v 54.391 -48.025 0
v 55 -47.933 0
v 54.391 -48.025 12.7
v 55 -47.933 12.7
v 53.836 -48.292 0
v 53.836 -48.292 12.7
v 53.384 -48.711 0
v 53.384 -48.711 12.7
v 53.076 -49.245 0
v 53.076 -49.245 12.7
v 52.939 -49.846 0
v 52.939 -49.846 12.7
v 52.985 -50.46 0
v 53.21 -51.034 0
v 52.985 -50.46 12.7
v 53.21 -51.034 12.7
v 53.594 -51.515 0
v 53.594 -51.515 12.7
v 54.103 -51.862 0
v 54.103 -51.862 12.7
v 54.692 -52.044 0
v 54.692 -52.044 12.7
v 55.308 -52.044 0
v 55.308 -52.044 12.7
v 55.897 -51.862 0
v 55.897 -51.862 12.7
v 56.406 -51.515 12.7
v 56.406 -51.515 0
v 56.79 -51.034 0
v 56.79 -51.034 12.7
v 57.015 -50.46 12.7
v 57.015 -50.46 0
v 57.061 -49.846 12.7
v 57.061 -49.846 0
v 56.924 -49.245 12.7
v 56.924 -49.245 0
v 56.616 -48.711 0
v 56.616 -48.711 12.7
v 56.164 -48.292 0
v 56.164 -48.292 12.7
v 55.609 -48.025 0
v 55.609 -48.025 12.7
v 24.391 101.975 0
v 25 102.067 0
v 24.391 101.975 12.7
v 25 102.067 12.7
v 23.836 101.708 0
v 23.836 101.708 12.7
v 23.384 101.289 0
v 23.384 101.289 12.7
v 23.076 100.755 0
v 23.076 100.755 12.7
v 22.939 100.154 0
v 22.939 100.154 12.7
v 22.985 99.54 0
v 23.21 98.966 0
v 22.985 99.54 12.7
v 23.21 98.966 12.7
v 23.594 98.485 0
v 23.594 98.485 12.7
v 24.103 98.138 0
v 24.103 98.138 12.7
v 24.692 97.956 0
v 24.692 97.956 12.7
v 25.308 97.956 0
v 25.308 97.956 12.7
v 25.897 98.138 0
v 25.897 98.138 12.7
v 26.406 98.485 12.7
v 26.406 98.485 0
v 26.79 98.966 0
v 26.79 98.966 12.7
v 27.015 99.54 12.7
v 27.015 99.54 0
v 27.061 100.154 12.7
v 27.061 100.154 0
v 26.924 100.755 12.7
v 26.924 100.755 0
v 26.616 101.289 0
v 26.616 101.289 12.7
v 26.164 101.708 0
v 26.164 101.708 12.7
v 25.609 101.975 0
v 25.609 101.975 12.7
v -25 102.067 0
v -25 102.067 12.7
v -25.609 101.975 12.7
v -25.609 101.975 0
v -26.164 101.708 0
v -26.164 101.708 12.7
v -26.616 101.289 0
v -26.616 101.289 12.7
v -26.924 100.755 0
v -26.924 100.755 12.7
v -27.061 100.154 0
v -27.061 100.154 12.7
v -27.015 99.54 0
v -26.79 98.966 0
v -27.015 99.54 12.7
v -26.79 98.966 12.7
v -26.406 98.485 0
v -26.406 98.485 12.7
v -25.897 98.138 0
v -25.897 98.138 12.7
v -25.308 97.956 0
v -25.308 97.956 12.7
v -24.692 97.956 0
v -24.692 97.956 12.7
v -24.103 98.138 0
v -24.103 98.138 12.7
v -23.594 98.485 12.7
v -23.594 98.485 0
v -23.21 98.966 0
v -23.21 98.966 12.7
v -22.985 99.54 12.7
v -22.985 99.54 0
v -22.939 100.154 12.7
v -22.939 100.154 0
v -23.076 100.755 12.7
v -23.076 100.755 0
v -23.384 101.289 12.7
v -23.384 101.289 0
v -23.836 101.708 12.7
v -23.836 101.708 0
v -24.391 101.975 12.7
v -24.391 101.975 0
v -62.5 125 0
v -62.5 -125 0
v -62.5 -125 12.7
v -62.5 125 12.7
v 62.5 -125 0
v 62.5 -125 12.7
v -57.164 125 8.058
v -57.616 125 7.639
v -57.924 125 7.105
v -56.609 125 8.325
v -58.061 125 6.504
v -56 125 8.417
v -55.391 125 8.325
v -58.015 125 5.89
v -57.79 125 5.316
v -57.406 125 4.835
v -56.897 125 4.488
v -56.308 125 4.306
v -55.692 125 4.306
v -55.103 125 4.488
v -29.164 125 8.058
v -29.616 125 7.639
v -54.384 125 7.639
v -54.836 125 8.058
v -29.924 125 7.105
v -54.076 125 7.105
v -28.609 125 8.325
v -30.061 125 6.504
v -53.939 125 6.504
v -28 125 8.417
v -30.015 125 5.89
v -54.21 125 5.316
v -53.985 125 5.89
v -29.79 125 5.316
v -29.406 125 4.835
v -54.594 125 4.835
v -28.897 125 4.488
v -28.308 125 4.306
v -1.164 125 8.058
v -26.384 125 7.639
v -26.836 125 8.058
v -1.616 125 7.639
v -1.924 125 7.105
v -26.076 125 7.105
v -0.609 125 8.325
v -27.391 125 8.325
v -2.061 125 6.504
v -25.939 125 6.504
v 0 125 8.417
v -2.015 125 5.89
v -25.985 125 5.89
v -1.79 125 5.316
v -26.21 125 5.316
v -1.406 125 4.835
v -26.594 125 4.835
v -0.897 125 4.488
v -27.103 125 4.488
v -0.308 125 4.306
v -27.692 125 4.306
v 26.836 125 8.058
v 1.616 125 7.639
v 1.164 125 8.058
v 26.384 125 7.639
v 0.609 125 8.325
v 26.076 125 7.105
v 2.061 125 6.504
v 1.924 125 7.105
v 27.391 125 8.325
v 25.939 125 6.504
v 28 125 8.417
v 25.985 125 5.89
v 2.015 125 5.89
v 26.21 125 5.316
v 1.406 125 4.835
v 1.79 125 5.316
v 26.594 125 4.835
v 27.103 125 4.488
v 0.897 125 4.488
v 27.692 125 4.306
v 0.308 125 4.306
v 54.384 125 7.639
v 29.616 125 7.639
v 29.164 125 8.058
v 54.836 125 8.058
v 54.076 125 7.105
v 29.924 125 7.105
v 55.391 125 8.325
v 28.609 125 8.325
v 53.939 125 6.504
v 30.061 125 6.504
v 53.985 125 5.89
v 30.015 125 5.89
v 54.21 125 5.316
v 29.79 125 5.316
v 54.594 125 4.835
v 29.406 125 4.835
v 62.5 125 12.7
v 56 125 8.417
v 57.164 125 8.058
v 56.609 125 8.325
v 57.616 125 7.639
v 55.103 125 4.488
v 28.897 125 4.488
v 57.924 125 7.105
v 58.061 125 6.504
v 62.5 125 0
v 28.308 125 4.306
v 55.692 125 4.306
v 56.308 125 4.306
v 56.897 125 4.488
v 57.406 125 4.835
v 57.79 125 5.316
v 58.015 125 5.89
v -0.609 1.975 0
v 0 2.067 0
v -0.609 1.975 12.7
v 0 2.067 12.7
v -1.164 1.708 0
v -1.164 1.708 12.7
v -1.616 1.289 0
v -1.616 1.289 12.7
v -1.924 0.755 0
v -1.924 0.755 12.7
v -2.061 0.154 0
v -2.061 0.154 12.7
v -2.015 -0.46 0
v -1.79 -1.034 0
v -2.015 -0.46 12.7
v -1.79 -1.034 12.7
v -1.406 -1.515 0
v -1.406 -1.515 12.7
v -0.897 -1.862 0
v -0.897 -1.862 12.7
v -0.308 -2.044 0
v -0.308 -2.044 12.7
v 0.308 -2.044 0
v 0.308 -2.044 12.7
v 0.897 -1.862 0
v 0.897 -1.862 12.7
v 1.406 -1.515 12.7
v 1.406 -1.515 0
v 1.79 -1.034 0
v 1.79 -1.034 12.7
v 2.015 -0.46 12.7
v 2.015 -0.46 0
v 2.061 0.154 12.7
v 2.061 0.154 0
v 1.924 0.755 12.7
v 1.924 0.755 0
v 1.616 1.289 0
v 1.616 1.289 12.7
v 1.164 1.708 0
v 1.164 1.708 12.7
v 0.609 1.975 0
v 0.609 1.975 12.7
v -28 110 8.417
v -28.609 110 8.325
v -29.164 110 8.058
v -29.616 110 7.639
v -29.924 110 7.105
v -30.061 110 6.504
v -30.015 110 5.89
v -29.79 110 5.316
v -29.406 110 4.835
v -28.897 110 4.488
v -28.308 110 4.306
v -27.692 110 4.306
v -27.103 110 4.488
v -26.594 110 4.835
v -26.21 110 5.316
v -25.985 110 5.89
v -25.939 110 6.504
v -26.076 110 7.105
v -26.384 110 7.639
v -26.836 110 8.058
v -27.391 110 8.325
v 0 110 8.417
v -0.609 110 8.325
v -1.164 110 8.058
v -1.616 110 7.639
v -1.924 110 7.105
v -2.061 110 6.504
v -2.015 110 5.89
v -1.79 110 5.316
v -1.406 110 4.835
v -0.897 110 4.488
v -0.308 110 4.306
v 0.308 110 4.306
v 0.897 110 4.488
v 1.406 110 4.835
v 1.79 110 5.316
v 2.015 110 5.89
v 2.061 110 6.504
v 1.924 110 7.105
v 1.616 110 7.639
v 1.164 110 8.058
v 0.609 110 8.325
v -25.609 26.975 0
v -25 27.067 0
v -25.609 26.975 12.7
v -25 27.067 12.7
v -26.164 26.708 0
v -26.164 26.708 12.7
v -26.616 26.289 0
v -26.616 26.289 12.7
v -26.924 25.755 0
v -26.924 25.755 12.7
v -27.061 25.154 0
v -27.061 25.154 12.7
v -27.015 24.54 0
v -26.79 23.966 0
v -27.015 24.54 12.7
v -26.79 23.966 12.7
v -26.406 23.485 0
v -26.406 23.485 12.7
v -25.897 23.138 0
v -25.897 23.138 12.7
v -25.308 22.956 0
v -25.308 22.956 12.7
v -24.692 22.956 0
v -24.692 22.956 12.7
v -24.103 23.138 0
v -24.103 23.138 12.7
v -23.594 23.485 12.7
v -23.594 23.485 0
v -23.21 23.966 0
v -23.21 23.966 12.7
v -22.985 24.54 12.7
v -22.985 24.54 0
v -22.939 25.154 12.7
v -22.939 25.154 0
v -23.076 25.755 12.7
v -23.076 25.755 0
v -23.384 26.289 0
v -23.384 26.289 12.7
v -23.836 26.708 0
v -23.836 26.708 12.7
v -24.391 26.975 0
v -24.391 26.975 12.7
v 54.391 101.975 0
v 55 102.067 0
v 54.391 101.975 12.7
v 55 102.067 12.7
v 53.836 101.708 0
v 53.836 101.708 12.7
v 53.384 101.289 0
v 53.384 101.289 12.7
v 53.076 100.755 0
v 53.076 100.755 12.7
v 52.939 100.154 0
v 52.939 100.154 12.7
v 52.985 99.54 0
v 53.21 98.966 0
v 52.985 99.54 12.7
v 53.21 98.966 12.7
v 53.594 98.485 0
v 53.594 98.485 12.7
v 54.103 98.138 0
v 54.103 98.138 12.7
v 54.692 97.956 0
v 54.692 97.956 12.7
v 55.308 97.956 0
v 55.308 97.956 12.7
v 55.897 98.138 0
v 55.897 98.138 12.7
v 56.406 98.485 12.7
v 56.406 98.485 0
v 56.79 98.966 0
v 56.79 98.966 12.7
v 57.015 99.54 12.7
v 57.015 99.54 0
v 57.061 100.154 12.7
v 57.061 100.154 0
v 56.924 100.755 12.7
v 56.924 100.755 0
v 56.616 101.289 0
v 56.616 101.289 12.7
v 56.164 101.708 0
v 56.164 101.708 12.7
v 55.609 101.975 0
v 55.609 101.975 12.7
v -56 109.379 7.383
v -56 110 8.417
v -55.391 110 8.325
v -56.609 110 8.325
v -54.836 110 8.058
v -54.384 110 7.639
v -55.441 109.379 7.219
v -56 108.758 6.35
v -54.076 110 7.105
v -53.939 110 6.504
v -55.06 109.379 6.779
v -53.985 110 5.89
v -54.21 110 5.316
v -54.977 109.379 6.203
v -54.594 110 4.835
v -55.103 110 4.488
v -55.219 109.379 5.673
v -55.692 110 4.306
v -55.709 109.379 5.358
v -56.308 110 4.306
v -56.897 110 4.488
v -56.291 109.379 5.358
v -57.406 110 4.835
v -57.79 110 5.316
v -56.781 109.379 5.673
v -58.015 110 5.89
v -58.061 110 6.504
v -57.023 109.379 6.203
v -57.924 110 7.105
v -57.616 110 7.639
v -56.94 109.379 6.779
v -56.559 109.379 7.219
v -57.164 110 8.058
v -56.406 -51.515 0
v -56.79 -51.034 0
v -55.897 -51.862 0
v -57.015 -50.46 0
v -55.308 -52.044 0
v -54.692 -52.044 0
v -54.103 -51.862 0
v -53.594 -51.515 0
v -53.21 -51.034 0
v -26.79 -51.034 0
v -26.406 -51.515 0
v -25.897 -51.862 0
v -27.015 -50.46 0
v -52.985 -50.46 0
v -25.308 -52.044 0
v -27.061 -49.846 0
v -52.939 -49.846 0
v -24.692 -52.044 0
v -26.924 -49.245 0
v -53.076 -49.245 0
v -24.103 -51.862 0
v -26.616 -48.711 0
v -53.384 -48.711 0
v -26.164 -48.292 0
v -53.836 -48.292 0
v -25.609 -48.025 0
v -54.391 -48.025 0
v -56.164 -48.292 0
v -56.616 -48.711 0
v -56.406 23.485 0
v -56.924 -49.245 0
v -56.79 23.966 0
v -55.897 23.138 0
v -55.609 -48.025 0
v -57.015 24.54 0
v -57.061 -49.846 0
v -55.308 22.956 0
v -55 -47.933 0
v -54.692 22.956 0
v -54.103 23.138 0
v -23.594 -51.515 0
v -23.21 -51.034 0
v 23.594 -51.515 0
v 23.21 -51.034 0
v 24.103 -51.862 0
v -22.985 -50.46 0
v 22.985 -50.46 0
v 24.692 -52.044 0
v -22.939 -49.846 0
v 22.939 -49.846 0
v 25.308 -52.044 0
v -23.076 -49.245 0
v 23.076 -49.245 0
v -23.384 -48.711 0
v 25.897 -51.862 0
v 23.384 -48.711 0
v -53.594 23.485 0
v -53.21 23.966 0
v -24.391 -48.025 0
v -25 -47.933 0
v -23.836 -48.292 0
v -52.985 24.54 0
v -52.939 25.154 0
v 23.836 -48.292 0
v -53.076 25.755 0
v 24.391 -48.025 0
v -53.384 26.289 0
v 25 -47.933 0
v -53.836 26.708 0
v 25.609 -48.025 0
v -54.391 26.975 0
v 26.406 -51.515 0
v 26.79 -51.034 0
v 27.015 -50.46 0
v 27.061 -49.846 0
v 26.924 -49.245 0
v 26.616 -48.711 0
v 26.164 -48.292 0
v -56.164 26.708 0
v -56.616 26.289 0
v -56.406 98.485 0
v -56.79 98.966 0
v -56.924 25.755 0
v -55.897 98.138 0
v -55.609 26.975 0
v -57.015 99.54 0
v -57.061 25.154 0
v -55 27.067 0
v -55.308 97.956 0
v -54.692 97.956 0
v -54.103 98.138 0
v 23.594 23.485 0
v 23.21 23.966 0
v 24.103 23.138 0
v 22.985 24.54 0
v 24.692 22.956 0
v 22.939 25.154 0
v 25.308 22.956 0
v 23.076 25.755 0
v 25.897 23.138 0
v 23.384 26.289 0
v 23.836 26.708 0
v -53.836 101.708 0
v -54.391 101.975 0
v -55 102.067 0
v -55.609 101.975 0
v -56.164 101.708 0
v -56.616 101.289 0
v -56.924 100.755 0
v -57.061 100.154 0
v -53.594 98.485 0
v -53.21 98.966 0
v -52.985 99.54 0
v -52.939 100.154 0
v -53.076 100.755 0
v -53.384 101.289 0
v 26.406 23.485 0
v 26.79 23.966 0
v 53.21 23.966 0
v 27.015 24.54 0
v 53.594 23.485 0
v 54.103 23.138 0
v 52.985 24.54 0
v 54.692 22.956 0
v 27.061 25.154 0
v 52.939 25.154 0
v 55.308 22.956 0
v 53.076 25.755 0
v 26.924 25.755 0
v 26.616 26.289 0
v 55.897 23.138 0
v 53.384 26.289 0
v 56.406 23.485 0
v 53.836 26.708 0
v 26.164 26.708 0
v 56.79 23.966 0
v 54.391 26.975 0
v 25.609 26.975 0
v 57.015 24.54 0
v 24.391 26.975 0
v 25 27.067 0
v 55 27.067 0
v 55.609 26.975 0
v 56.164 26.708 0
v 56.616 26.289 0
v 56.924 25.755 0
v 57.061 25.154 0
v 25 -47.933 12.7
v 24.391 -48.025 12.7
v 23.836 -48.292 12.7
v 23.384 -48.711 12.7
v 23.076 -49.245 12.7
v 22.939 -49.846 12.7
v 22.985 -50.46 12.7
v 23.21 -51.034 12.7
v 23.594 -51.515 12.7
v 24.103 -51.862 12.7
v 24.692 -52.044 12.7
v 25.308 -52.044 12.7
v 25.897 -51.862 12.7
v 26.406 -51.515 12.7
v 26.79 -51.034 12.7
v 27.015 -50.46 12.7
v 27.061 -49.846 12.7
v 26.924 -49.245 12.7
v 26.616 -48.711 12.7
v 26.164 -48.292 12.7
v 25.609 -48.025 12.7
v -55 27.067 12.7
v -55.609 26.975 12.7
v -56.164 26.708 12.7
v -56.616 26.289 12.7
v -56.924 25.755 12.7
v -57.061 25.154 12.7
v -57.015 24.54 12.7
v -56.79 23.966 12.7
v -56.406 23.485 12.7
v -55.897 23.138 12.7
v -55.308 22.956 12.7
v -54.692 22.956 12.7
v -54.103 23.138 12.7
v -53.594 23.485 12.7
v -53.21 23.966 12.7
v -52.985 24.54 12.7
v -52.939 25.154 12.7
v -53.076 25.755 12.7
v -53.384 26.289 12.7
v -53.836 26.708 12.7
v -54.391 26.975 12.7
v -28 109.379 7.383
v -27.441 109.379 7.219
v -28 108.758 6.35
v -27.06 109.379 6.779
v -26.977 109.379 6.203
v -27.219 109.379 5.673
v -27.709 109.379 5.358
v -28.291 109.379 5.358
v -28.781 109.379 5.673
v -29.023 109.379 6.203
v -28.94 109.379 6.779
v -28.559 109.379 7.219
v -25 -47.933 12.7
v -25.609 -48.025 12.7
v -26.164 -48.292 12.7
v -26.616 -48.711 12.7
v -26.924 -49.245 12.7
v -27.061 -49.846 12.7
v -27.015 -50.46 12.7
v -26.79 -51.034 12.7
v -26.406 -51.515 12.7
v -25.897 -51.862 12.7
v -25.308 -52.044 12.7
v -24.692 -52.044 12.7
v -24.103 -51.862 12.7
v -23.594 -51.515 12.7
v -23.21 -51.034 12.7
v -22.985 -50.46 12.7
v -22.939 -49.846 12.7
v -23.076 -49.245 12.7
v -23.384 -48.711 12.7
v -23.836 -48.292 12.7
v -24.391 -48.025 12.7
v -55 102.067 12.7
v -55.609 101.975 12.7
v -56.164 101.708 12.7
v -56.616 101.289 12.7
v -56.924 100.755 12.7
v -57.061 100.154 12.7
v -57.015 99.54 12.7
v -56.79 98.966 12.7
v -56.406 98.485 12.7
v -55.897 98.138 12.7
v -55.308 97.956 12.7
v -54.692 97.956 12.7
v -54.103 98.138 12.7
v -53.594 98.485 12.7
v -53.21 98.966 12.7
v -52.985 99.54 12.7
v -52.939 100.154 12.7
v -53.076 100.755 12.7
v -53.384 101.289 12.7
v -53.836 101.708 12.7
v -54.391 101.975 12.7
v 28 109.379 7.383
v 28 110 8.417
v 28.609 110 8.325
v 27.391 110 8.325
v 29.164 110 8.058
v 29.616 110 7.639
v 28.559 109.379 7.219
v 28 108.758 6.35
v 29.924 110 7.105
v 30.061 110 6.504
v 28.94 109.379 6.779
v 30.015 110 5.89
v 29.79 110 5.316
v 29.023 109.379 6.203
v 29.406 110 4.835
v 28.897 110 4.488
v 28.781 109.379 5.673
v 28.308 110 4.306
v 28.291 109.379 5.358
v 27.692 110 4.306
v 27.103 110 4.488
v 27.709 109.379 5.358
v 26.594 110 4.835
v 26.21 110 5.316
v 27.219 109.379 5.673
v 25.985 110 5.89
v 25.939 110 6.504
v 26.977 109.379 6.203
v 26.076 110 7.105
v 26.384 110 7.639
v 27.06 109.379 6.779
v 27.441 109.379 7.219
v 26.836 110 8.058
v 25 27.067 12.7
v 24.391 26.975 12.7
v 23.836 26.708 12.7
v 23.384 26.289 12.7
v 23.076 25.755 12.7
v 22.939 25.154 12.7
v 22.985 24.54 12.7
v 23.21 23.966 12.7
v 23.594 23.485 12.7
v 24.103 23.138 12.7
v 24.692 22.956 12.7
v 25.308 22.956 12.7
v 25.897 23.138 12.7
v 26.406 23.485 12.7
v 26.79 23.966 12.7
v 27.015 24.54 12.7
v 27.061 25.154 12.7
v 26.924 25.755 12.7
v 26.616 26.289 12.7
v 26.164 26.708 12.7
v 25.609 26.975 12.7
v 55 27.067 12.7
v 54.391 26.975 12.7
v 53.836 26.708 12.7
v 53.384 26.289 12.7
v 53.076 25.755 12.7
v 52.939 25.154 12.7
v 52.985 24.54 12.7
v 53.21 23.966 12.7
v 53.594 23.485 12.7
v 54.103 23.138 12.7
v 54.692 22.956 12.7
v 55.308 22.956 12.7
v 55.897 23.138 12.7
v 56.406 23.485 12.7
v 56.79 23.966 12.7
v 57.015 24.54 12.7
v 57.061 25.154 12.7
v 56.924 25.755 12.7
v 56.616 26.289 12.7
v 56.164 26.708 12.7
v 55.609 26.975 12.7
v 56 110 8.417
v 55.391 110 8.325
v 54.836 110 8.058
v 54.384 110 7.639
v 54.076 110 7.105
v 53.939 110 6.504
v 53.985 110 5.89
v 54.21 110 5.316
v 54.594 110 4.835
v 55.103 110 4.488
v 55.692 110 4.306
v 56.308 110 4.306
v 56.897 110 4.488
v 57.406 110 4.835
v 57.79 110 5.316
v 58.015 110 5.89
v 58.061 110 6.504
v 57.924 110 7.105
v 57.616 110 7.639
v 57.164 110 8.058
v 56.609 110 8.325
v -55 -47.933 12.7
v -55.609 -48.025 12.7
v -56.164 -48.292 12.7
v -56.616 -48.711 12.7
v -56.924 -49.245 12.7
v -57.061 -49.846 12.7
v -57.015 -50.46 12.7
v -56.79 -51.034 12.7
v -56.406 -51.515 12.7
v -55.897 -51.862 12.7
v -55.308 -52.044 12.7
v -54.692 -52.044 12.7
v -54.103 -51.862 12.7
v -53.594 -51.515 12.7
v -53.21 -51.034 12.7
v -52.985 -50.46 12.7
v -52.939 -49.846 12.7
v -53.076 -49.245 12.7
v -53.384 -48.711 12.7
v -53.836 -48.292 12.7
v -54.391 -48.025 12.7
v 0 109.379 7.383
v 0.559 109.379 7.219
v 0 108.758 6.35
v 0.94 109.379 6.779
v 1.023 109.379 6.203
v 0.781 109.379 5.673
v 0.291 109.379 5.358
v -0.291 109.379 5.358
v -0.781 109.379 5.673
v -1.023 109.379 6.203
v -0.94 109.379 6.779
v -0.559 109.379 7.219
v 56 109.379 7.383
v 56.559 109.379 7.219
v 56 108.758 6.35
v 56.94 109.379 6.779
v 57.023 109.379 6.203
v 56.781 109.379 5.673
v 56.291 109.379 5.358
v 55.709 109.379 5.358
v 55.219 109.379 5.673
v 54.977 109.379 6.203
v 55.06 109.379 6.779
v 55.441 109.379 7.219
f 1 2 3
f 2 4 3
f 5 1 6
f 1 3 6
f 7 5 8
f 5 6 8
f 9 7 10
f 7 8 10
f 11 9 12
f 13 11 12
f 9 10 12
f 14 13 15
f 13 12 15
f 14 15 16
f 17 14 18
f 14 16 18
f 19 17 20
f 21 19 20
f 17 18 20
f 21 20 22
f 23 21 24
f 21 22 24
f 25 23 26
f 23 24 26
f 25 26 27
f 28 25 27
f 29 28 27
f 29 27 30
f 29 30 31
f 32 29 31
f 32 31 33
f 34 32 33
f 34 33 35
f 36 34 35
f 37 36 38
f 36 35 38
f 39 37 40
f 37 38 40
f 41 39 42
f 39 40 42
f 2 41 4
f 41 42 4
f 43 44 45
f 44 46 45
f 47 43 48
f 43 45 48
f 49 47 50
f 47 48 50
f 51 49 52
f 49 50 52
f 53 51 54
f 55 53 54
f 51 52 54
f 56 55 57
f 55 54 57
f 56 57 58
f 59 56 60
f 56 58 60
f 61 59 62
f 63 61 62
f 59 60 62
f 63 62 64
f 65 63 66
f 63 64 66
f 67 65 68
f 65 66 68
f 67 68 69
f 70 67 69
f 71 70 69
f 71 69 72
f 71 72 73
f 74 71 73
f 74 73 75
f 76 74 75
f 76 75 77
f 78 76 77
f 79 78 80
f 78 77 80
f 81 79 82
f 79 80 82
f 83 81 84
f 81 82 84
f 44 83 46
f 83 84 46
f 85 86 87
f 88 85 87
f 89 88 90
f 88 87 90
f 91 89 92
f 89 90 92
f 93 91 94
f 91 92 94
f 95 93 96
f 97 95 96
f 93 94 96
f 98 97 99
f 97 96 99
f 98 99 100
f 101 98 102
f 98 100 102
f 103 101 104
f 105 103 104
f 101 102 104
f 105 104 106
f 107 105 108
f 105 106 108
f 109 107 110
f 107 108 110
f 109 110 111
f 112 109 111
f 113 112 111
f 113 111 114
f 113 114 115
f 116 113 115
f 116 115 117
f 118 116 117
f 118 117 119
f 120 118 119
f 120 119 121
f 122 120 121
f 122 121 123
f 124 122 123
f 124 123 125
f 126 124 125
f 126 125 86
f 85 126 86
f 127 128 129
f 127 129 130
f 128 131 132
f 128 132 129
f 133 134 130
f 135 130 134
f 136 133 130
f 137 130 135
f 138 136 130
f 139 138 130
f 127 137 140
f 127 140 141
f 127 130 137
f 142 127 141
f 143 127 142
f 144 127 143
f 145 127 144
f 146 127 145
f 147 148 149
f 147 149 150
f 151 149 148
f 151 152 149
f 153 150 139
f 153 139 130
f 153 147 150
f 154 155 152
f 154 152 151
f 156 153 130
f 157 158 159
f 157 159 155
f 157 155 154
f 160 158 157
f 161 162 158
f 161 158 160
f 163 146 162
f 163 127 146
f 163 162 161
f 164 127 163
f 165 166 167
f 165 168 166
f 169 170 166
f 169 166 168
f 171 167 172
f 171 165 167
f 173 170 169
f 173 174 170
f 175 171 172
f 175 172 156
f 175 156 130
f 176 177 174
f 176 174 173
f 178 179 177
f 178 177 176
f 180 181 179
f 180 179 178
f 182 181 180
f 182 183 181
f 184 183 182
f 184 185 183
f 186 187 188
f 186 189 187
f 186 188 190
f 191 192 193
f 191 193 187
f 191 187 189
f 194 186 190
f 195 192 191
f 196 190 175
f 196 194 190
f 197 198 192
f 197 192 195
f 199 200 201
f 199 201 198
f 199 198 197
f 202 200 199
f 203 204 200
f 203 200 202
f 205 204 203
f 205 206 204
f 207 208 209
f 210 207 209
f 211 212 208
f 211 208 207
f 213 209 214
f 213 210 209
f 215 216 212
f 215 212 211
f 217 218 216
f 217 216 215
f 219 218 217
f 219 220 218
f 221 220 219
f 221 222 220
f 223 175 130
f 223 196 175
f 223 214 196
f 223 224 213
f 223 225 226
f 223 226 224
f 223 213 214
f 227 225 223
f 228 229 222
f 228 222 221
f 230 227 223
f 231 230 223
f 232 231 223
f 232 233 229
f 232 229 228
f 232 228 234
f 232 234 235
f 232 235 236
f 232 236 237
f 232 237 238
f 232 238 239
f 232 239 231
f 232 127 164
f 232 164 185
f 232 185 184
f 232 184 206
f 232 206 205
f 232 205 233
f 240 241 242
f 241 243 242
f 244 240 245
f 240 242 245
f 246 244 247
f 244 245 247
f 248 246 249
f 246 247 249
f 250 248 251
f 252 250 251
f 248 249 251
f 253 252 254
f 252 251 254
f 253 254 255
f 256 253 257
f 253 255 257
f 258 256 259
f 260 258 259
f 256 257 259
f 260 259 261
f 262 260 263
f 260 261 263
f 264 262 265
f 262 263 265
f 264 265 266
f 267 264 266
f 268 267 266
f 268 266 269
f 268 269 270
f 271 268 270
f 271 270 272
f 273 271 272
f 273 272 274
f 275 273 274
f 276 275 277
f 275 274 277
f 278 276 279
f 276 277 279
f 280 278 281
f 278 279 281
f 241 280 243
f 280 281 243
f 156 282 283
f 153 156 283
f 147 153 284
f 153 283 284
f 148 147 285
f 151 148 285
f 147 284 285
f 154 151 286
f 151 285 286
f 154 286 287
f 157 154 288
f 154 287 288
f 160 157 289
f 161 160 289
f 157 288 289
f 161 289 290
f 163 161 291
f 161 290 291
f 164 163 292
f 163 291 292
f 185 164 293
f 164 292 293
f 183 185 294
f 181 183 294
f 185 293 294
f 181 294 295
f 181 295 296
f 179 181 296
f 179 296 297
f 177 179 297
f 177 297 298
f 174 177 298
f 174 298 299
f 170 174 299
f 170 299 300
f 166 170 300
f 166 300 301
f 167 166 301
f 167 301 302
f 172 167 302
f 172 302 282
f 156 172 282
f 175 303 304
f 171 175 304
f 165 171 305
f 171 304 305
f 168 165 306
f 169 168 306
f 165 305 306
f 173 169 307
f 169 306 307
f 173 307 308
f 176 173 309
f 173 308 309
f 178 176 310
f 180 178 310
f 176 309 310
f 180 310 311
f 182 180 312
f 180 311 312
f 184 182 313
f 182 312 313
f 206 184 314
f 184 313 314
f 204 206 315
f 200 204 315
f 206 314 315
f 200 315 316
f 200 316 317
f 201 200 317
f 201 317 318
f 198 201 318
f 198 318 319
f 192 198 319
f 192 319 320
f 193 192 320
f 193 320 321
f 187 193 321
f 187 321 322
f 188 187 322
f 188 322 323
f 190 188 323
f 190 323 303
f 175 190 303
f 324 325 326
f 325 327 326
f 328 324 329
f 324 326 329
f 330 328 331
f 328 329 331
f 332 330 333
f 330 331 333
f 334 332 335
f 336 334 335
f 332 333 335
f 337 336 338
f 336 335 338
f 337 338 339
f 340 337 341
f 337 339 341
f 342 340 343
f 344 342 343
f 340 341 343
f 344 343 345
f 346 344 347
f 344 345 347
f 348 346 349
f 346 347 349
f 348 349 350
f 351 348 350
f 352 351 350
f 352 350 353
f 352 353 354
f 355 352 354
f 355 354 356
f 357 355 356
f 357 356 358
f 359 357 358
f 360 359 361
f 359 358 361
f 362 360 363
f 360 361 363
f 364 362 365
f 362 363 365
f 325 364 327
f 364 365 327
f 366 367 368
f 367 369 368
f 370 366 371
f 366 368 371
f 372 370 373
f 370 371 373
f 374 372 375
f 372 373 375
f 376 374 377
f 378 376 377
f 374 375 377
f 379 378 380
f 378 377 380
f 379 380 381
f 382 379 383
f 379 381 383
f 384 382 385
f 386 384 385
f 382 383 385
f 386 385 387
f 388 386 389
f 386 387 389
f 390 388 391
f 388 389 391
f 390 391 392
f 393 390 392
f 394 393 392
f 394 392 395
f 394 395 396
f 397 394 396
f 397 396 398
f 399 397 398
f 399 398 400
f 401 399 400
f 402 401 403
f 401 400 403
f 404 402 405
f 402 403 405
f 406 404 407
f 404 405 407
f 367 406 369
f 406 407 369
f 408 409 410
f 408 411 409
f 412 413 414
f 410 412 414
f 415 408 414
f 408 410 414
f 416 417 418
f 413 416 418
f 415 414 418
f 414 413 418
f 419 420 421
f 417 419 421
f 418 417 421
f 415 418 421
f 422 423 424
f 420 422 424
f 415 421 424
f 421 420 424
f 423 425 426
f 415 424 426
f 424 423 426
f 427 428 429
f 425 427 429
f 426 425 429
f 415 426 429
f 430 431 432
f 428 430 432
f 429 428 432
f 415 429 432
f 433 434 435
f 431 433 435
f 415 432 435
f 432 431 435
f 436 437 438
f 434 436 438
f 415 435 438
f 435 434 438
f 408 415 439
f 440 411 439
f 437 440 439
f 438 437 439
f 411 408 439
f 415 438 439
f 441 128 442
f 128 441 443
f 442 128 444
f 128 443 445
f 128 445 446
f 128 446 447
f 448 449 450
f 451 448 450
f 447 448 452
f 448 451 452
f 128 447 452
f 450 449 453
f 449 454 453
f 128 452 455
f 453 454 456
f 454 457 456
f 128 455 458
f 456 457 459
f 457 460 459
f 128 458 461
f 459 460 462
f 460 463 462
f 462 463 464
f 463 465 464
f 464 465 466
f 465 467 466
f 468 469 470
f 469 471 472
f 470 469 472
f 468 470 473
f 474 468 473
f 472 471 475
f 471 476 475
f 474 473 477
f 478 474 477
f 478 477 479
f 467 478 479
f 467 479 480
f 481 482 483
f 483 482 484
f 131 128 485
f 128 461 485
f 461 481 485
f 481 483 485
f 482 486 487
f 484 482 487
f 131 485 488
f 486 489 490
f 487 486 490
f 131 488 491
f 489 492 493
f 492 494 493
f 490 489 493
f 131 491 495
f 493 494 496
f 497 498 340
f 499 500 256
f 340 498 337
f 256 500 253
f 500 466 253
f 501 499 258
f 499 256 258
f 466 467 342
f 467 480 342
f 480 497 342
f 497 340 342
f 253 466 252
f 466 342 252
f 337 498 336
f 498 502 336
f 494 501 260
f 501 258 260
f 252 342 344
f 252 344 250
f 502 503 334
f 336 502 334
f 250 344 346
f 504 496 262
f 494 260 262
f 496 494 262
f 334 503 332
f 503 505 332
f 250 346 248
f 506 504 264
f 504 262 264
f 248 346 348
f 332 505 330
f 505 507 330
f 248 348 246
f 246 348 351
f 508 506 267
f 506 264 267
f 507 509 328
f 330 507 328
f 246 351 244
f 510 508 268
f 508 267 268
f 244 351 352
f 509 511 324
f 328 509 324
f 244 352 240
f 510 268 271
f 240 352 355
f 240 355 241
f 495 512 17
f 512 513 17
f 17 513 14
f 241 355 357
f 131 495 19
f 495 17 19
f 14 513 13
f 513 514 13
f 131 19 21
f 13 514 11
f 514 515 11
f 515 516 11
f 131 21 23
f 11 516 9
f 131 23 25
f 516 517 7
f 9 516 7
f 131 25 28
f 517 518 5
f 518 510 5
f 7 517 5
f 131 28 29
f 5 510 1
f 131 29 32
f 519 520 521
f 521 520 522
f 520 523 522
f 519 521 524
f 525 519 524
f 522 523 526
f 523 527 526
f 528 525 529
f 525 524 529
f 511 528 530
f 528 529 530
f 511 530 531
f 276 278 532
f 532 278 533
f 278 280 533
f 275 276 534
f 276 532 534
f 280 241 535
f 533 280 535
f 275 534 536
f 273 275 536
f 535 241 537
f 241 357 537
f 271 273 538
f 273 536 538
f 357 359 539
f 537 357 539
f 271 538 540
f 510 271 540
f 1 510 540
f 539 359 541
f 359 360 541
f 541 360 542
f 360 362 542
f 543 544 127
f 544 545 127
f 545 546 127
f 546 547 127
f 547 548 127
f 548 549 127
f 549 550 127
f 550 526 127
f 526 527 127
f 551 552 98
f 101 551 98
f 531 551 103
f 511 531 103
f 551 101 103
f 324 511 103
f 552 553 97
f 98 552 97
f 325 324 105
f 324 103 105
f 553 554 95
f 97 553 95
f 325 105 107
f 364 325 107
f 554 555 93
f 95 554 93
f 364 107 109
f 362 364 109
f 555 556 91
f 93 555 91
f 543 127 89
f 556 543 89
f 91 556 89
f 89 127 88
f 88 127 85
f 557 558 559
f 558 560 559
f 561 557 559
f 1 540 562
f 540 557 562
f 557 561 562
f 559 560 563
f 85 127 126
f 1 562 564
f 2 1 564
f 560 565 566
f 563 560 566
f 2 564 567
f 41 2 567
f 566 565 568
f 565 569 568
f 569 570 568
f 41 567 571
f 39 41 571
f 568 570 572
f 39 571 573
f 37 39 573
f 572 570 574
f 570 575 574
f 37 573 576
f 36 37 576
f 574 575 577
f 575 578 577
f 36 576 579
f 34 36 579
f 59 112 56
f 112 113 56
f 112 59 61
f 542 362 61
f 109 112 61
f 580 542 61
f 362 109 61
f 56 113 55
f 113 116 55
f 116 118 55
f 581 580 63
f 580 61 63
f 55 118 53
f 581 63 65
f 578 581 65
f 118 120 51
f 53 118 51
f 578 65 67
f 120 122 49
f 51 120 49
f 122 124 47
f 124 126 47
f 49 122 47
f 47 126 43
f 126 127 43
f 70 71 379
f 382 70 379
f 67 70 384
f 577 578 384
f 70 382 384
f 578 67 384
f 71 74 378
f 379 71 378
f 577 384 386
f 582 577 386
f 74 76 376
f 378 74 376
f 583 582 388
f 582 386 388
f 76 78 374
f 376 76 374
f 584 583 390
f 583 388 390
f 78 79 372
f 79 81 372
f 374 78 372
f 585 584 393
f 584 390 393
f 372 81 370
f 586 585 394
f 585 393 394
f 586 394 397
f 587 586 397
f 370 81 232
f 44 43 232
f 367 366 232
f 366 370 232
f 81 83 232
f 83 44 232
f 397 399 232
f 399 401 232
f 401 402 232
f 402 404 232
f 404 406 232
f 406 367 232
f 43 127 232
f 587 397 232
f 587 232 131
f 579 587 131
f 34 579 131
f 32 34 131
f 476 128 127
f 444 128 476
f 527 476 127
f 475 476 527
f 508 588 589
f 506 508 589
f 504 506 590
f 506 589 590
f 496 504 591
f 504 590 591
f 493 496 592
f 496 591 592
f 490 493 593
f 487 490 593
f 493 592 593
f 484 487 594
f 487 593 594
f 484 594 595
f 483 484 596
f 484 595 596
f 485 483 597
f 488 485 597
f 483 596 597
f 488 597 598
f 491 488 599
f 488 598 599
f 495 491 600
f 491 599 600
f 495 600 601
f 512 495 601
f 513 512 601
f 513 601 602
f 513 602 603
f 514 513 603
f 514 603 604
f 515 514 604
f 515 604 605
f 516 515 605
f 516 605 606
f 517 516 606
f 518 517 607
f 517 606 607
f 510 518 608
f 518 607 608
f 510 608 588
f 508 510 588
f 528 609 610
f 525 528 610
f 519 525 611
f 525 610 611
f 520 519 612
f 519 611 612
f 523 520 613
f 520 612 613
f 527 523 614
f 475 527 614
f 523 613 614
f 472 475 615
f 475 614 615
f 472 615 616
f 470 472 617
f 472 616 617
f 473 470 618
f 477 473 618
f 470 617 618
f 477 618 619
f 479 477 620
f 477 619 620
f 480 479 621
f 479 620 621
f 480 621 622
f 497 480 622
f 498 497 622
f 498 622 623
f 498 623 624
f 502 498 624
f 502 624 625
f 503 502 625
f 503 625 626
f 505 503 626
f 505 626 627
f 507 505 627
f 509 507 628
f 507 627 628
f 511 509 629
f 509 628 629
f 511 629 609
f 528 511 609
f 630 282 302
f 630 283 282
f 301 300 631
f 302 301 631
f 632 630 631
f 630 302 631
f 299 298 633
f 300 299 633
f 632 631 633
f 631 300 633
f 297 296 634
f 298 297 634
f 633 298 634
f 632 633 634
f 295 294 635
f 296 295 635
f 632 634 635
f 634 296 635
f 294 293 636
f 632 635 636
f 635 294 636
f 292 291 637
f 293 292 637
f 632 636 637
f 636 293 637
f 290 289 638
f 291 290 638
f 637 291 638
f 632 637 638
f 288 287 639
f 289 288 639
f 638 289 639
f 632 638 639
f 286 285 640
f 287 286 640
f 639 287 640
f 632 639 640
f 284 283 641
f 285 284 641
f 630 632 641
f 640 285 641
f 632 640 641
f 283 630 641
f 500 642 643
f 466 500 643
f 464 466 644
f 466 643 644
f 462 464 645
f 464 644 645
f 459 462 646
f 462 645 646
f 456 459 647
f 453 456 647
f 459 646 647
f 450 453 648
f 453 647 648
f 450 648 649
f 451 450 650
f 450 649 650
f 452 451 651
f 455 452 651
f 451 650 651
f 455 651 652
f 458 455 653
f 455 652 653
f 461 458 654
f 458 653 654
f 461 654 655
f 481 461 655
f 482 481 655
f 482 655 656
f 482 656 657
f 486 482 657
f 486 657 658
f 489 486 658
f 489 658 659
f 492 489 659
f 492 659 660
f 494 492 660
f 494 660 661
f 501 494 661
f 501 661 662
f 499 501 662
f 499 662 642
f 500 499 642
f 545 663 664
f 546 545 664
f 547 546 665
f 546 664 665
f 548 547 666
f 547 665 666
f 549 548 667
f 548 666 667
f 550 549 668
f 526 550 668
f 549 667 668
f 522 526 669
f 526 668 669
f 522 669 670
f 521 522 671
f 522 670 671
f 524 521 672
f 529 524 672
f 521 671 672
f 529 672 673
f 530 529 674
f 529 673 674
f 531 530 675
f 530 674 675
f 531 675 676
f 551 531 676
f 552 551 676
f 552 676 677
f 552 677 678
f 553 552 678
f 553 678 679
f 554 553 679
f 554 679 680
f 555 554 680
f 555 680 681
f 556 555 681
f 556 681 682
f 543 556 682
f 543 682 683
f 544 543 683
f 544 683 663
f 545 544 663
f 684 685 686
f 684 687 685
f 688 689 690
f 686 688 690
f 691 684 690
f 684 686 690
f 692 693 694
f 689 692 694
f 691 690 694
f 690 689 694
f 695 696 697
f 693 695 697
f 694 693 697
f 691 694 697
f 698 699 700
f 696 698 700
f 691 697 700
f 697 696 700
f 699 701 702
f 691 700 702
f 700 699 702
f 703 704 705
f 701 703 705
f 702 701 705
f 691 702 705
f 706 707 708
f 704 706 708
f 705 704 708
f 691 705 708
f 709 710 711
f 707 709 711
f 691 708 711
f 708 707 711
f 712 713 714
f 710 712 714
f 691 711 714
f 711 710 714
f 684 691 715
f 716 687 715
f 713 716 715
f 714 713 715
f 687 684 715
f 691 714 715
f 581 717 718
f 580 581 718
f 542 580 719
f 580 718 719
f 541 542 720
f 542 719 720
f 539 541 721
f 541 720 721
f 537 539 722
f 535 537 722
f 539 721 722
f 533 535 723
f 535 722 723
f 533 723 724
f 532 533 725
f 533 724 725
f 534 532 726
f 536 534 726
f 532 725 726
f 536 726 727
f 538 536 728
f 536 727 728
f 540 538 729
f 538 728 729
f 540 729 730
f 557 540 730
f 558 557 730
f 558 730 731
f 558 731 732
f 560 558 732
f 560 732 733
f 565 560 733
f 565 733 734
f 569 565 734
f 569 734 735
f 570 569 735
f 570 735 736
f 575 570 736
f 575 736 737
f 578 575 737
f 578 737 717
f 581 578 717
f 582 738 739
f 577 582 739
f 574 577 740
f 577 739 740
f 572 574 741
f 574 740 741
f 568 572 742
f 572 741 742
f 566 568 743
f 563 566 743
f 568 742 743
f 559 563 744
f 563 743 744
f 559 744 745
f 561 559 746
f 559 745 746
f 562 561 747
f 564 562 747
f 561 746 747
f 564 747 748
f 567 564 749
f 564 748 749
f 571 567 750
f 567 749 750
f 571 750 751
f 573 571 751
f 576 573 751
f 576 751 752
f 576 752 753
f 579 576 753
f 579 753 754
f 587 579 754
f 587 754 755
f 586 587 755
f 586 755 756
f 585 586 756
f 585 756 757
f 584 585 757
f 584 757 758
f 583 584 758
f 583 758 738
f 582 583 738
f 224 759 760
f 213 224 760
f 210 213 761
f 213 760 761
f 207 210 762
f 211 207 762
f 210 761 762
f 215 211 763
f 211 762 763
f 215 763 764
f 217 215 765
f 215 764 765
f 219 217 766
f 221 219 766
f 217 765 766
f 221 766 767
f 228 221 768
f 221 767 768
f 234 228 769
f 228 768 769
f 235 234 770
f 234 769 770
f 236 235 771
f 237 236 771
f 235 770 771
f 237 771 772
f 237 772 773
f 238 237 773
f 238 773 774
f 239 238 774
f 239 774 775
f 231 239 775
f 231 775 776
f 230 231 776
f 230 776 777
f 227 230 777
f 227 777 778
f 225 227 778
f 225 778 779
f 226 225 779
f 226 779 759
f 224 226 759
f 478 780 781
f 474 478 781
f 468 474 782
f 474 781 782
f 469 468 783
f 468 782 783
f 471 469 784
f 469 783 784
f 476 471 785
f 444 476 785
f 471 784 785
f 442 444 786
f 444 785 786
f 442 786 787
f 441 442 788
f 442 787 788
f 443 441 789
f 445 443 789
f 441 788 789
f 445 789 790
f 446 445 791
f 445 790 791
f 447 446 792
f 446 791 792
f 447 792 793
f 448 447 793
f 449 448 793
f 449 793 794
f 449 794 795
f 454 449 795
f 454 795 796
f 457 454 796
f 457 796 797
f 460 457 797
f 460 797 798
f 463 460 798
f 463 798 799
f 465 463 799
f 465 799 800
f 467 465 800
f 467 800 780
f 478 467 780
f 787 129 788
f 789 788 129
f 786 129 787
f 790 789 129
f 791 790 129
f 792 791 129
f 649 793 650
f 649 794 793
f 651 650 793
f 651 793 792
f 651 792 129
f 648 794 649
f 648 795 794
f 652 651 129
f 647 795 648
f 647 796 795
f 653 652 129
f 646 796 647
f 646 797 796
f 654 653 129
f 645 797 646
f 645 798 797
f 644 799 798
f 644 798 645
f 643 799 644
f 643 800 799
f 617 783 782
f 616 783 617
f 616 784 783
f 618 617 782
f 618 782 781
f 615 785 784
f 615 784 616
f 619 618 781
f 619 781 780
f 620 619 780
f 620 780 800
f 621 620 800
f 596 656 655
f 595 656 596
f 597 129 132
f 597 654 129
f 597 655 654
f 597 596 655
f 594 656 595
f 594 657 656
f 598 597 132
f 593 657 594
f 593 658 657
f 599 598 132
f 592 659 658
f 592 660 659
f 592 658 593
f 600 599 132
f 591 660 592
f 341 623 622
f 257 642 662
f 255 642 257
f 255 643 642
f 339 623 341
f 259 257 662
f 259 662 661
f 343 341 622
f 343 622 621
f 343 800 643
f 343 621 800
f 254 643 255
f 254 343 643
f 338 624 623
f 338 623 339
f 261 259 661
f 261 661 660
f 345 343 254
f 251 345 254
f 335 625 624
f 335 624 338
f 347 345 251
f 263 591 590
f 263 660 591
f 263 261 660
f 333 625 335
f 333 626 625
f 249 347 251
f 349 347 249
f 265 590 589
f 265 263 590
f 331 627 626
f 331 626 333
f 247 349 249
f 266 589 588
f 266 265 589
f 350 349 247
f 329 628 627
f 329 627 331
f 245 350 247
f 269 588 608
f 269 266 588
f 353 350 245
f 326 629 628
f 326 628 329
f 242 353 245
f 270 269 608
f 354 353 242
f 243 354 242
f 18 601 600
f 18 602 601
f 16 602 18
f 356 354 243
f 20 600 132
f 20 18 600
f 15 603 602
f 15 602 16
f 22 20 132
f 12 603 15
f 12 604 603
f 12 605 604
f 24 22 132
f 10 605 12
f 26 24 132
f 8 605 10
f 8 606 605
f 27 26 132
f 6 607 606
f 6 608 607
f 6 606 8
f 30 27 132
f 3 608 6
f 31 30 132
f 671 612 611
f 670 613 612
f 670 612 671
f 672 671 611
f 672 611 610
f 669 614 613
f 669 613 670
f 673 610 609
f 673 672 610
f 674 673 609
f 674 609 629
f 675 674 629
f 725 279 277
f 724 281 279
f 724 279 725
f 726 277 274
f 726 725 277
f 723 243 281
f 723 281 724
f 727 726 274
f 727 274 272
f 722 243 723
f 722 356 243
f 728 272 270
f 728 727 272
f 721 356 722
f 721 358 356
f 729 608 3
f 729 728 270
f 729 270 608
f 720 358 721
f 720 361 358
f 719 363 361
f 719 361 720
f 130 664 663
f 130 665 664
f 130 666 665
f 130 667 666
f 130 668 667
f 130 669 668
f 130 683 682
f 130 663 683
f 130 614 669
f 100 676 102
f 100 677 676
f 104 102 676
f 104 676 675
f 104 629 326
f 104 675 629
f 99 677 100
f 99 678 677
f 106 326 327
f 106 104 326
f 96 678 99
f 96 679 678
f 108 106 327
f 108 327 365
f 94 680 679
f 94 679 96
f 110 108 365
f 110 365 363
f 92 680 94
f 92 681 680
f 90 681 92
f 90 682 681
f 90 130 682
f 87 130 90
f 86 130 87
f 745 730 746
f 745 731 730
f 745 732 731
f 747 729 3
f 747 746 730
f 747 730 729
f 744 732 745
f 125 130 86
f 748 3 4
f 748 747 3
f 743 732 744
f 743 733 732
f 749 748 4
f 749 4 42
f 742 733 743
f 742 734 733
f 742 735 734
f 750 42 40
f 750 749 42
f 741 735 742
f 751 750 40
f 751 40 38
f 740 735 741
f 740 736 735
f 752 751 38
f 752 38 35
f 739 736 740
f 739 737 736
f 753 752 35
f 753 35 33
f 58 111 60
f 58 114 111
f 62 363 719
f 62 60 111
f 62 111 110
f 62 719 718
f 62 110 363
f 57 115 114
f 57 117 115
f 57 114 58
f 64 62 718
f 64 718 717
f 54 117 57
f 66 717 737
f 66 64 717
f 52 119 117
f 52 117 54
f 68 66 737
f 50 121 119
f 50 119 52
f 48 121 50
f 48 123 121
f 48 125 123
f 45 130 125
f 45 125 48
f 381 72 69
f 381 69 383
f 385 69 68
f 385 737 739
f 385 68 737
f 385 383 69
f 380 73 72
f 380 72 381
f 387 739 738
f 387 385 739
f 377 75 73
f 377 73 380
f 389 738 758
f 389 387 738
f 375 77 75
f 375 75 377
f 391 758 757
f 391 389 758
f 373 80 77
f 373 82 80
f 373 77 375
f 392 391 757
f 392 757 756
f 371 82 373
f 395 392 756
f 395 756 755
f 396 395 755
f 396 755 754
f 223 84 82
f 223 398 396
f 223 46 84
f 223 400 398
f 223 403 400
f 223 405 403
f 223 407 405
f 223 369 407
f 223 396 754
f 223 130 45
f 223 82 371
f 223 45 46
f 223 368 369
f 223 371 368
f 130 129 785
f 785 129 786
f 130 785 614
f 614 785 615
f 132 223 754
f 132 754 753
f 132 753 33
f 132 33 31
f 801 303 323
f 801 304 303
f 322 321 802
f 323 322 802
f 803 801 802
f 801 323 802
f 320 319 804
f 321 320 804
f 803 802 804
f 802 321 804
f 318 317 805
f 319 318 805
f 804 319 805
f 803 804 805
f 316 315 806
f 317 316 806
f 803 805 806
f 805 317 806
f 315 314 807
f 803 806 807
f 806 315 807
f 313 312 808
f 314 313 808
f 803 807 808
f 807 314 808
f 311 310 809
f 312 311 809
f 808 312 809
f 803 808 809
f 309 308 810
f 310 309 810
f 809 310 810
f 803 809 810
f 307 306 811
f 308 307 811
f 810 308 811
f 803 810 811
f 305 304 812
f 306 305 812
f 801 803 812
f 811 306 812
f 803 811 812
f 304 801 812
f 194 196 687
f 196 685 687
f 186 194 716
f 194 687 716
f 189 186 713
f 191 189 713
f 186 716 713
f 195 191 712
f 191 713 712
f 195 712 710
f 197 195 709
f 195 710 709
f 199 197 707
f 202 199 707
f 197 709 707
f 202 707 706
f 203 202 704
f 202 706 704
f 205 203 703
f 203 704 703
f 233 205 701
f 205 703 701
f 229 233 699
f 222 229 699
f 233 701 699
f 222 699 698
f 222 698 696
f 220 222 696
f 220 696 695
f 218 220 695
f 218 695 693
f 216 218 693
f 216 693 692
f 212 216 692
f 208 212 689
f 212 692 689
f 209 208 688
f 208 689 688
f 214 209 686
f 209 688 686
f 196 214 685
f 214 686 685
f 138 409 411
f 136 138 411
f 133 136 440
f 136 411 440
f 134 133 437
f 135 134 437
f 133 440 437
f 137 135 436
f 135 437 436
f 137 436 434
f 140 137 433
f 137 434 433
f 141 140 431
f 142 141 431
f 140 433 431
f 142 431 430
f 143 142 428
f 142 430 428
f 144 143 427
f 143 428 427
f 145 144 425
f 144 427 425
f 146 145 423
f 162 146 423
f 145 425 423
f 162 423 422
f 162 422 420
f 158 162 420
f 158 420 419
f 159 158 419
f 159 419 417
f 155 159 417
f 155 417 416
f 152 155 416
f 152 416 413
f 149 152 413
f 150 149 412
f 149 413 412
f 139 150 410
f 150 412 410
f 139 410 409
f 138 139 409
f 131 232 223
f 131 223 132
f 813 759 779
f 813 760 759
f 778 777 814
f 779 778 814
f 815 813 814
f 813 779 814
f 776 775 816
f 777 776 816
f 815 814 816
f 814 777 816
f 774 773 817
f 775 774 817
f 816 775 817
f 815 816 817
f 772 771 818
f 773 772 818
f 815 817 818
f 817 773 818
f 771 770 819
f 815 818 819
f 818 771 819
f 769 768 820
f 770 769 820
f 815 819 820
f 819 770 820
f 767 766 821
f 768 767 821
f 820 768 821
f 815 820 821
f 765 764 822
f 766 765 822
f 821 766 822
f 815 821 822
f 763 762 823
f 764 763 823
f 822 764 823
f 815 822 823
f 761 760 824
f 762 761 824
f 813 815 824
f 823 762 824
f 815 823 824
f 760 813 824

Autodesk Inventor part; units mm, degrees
ref_plane "YZ Plane" through (0, 0, 0) normal (1, 0, 0) x (0, 1, 0)
ref_plane "XZ Plane" through (0, 0, 0) normal (0, 1, 0) x (-1, 0, 0)
ref_plane "XY Plane" through (0, 0, 0) normal (0, 0, 1) x (1, 0, 0)
sketch "Esboço1" plane through (0, 0, 0) normal (0, 0, 1) x (1, 0, 0)
  line L0 (-62.5, 125) -> (62.5, 125)
  line L1 (62.5, 125) -> (62.5, -125)
  line L2 (62.5, -125) -> (-62.5, -125)
  line L3 (-62.5, -125) -> (-62.5, 125)
  line L4 (-62.5, 125) -> (62.5, -125) construction
  line L5 (62.5, 125) -> (-62.5, -125) construction
  point P0 (0, 0)
  dimension "d0" = 125
  dimension "d1" = 250
extrude "Extrusão1" add sketch "Esboço1" along normal blind 12.7
sketch "Esboço4" plane through (0, 0, 0) normal (0, 0, -1) x (-1, 0, 0)
  circle A0 centre (-25, 100) radius 2.75 construction
  circle A1 centre (-55, 100) radius 2.75 construction
  circle A2 centre (25, 100) radius 2.75 construction
  circle A3 centre (55, 100) radius 2.75 construction
  circle A4 centre (55, 25) radius 2.75 construction
  circle A5 centre (25, 25) radius 2.75 construction
  circle A6 centre (55, -50) radius 2.75 construction
  circle A7 centre (25, -50) radius 2.75 construction
  circle A8 centre (-25, -50) radius 2.75 construction
  circle A9 centre (-55, -50) radius 2.75 construction
  circle A10 centre (-25, 25) radius 2.75 construction
  circle A11 centre (-55, 25) radius 2.75 construction
  point P0 (0, 0)
hole "Furo1" at (0, 0, 0) at (25, 100, 0) at (55, 100, 0) at (-25, 100, 0) at (-55, 100, 0) at (-55, 25, 0) at (-25, 25, 0) at (-55, -50, 0) at (-25, -50, 0) at (25, -50, 0) at (55, -50, 0) at (25, 25, 0) at (55, 25, 0) direction (0, 0, 1) diameter 4.134 end through all thread size "M5x0.8" class "6H" standard "ISO Metric profile"
sketch "Esboço5" plane through (-62.5, 125, 0) normal (0, 1, 0) x (1, 0, 0)
  line L0 (0, 0) -> (0, -12.7) construction
  line L1 (0, -6.35) -> (125, -6.35) construction
  line L2 (125, 0) -> (125, -12.7) construction
  circle A0 centre (62.5, -6.35) radius 2 construction
  circle A1 centre (90.5, -6.35) radius 2 construction
  circle A2 centre (118.5, -6.35) radius 2 construction
  circle A3 centre (34.5, -6.35) radius 2 construction
  circle A4 centre (62.5, -6.35) radius 2 construction
  circle A5 centre (90.5, -6.35) radius 2 construction
  circle A6 centre (6.5, -6.35) radius 2 construction
  circle A7 centre (34.5, -6.35) radius 2 construction
  circle A8 centre (62.5, -6.35) radius 2 construction
  point P0 (62.5, 0)
  dimension "d11" = 4
  dimension "d14" = 28
  dimension "d17" = 28
  dimension "d28" = 62.5
hole "Furo2" at (-56, 125, 6.35) at (-28, 125, 6.35) at (0, 125, 6.35) at (28, 125, 6.35) at (56, 125, 6.35) direction (0, -1, 0) diameter 4.134 depth 15 tip angle 118 thread size "M5x0.8" class "6H" standard "ISO Metric profile"
properties part number "BLOCO_SUPORTE_SPINDLE"
